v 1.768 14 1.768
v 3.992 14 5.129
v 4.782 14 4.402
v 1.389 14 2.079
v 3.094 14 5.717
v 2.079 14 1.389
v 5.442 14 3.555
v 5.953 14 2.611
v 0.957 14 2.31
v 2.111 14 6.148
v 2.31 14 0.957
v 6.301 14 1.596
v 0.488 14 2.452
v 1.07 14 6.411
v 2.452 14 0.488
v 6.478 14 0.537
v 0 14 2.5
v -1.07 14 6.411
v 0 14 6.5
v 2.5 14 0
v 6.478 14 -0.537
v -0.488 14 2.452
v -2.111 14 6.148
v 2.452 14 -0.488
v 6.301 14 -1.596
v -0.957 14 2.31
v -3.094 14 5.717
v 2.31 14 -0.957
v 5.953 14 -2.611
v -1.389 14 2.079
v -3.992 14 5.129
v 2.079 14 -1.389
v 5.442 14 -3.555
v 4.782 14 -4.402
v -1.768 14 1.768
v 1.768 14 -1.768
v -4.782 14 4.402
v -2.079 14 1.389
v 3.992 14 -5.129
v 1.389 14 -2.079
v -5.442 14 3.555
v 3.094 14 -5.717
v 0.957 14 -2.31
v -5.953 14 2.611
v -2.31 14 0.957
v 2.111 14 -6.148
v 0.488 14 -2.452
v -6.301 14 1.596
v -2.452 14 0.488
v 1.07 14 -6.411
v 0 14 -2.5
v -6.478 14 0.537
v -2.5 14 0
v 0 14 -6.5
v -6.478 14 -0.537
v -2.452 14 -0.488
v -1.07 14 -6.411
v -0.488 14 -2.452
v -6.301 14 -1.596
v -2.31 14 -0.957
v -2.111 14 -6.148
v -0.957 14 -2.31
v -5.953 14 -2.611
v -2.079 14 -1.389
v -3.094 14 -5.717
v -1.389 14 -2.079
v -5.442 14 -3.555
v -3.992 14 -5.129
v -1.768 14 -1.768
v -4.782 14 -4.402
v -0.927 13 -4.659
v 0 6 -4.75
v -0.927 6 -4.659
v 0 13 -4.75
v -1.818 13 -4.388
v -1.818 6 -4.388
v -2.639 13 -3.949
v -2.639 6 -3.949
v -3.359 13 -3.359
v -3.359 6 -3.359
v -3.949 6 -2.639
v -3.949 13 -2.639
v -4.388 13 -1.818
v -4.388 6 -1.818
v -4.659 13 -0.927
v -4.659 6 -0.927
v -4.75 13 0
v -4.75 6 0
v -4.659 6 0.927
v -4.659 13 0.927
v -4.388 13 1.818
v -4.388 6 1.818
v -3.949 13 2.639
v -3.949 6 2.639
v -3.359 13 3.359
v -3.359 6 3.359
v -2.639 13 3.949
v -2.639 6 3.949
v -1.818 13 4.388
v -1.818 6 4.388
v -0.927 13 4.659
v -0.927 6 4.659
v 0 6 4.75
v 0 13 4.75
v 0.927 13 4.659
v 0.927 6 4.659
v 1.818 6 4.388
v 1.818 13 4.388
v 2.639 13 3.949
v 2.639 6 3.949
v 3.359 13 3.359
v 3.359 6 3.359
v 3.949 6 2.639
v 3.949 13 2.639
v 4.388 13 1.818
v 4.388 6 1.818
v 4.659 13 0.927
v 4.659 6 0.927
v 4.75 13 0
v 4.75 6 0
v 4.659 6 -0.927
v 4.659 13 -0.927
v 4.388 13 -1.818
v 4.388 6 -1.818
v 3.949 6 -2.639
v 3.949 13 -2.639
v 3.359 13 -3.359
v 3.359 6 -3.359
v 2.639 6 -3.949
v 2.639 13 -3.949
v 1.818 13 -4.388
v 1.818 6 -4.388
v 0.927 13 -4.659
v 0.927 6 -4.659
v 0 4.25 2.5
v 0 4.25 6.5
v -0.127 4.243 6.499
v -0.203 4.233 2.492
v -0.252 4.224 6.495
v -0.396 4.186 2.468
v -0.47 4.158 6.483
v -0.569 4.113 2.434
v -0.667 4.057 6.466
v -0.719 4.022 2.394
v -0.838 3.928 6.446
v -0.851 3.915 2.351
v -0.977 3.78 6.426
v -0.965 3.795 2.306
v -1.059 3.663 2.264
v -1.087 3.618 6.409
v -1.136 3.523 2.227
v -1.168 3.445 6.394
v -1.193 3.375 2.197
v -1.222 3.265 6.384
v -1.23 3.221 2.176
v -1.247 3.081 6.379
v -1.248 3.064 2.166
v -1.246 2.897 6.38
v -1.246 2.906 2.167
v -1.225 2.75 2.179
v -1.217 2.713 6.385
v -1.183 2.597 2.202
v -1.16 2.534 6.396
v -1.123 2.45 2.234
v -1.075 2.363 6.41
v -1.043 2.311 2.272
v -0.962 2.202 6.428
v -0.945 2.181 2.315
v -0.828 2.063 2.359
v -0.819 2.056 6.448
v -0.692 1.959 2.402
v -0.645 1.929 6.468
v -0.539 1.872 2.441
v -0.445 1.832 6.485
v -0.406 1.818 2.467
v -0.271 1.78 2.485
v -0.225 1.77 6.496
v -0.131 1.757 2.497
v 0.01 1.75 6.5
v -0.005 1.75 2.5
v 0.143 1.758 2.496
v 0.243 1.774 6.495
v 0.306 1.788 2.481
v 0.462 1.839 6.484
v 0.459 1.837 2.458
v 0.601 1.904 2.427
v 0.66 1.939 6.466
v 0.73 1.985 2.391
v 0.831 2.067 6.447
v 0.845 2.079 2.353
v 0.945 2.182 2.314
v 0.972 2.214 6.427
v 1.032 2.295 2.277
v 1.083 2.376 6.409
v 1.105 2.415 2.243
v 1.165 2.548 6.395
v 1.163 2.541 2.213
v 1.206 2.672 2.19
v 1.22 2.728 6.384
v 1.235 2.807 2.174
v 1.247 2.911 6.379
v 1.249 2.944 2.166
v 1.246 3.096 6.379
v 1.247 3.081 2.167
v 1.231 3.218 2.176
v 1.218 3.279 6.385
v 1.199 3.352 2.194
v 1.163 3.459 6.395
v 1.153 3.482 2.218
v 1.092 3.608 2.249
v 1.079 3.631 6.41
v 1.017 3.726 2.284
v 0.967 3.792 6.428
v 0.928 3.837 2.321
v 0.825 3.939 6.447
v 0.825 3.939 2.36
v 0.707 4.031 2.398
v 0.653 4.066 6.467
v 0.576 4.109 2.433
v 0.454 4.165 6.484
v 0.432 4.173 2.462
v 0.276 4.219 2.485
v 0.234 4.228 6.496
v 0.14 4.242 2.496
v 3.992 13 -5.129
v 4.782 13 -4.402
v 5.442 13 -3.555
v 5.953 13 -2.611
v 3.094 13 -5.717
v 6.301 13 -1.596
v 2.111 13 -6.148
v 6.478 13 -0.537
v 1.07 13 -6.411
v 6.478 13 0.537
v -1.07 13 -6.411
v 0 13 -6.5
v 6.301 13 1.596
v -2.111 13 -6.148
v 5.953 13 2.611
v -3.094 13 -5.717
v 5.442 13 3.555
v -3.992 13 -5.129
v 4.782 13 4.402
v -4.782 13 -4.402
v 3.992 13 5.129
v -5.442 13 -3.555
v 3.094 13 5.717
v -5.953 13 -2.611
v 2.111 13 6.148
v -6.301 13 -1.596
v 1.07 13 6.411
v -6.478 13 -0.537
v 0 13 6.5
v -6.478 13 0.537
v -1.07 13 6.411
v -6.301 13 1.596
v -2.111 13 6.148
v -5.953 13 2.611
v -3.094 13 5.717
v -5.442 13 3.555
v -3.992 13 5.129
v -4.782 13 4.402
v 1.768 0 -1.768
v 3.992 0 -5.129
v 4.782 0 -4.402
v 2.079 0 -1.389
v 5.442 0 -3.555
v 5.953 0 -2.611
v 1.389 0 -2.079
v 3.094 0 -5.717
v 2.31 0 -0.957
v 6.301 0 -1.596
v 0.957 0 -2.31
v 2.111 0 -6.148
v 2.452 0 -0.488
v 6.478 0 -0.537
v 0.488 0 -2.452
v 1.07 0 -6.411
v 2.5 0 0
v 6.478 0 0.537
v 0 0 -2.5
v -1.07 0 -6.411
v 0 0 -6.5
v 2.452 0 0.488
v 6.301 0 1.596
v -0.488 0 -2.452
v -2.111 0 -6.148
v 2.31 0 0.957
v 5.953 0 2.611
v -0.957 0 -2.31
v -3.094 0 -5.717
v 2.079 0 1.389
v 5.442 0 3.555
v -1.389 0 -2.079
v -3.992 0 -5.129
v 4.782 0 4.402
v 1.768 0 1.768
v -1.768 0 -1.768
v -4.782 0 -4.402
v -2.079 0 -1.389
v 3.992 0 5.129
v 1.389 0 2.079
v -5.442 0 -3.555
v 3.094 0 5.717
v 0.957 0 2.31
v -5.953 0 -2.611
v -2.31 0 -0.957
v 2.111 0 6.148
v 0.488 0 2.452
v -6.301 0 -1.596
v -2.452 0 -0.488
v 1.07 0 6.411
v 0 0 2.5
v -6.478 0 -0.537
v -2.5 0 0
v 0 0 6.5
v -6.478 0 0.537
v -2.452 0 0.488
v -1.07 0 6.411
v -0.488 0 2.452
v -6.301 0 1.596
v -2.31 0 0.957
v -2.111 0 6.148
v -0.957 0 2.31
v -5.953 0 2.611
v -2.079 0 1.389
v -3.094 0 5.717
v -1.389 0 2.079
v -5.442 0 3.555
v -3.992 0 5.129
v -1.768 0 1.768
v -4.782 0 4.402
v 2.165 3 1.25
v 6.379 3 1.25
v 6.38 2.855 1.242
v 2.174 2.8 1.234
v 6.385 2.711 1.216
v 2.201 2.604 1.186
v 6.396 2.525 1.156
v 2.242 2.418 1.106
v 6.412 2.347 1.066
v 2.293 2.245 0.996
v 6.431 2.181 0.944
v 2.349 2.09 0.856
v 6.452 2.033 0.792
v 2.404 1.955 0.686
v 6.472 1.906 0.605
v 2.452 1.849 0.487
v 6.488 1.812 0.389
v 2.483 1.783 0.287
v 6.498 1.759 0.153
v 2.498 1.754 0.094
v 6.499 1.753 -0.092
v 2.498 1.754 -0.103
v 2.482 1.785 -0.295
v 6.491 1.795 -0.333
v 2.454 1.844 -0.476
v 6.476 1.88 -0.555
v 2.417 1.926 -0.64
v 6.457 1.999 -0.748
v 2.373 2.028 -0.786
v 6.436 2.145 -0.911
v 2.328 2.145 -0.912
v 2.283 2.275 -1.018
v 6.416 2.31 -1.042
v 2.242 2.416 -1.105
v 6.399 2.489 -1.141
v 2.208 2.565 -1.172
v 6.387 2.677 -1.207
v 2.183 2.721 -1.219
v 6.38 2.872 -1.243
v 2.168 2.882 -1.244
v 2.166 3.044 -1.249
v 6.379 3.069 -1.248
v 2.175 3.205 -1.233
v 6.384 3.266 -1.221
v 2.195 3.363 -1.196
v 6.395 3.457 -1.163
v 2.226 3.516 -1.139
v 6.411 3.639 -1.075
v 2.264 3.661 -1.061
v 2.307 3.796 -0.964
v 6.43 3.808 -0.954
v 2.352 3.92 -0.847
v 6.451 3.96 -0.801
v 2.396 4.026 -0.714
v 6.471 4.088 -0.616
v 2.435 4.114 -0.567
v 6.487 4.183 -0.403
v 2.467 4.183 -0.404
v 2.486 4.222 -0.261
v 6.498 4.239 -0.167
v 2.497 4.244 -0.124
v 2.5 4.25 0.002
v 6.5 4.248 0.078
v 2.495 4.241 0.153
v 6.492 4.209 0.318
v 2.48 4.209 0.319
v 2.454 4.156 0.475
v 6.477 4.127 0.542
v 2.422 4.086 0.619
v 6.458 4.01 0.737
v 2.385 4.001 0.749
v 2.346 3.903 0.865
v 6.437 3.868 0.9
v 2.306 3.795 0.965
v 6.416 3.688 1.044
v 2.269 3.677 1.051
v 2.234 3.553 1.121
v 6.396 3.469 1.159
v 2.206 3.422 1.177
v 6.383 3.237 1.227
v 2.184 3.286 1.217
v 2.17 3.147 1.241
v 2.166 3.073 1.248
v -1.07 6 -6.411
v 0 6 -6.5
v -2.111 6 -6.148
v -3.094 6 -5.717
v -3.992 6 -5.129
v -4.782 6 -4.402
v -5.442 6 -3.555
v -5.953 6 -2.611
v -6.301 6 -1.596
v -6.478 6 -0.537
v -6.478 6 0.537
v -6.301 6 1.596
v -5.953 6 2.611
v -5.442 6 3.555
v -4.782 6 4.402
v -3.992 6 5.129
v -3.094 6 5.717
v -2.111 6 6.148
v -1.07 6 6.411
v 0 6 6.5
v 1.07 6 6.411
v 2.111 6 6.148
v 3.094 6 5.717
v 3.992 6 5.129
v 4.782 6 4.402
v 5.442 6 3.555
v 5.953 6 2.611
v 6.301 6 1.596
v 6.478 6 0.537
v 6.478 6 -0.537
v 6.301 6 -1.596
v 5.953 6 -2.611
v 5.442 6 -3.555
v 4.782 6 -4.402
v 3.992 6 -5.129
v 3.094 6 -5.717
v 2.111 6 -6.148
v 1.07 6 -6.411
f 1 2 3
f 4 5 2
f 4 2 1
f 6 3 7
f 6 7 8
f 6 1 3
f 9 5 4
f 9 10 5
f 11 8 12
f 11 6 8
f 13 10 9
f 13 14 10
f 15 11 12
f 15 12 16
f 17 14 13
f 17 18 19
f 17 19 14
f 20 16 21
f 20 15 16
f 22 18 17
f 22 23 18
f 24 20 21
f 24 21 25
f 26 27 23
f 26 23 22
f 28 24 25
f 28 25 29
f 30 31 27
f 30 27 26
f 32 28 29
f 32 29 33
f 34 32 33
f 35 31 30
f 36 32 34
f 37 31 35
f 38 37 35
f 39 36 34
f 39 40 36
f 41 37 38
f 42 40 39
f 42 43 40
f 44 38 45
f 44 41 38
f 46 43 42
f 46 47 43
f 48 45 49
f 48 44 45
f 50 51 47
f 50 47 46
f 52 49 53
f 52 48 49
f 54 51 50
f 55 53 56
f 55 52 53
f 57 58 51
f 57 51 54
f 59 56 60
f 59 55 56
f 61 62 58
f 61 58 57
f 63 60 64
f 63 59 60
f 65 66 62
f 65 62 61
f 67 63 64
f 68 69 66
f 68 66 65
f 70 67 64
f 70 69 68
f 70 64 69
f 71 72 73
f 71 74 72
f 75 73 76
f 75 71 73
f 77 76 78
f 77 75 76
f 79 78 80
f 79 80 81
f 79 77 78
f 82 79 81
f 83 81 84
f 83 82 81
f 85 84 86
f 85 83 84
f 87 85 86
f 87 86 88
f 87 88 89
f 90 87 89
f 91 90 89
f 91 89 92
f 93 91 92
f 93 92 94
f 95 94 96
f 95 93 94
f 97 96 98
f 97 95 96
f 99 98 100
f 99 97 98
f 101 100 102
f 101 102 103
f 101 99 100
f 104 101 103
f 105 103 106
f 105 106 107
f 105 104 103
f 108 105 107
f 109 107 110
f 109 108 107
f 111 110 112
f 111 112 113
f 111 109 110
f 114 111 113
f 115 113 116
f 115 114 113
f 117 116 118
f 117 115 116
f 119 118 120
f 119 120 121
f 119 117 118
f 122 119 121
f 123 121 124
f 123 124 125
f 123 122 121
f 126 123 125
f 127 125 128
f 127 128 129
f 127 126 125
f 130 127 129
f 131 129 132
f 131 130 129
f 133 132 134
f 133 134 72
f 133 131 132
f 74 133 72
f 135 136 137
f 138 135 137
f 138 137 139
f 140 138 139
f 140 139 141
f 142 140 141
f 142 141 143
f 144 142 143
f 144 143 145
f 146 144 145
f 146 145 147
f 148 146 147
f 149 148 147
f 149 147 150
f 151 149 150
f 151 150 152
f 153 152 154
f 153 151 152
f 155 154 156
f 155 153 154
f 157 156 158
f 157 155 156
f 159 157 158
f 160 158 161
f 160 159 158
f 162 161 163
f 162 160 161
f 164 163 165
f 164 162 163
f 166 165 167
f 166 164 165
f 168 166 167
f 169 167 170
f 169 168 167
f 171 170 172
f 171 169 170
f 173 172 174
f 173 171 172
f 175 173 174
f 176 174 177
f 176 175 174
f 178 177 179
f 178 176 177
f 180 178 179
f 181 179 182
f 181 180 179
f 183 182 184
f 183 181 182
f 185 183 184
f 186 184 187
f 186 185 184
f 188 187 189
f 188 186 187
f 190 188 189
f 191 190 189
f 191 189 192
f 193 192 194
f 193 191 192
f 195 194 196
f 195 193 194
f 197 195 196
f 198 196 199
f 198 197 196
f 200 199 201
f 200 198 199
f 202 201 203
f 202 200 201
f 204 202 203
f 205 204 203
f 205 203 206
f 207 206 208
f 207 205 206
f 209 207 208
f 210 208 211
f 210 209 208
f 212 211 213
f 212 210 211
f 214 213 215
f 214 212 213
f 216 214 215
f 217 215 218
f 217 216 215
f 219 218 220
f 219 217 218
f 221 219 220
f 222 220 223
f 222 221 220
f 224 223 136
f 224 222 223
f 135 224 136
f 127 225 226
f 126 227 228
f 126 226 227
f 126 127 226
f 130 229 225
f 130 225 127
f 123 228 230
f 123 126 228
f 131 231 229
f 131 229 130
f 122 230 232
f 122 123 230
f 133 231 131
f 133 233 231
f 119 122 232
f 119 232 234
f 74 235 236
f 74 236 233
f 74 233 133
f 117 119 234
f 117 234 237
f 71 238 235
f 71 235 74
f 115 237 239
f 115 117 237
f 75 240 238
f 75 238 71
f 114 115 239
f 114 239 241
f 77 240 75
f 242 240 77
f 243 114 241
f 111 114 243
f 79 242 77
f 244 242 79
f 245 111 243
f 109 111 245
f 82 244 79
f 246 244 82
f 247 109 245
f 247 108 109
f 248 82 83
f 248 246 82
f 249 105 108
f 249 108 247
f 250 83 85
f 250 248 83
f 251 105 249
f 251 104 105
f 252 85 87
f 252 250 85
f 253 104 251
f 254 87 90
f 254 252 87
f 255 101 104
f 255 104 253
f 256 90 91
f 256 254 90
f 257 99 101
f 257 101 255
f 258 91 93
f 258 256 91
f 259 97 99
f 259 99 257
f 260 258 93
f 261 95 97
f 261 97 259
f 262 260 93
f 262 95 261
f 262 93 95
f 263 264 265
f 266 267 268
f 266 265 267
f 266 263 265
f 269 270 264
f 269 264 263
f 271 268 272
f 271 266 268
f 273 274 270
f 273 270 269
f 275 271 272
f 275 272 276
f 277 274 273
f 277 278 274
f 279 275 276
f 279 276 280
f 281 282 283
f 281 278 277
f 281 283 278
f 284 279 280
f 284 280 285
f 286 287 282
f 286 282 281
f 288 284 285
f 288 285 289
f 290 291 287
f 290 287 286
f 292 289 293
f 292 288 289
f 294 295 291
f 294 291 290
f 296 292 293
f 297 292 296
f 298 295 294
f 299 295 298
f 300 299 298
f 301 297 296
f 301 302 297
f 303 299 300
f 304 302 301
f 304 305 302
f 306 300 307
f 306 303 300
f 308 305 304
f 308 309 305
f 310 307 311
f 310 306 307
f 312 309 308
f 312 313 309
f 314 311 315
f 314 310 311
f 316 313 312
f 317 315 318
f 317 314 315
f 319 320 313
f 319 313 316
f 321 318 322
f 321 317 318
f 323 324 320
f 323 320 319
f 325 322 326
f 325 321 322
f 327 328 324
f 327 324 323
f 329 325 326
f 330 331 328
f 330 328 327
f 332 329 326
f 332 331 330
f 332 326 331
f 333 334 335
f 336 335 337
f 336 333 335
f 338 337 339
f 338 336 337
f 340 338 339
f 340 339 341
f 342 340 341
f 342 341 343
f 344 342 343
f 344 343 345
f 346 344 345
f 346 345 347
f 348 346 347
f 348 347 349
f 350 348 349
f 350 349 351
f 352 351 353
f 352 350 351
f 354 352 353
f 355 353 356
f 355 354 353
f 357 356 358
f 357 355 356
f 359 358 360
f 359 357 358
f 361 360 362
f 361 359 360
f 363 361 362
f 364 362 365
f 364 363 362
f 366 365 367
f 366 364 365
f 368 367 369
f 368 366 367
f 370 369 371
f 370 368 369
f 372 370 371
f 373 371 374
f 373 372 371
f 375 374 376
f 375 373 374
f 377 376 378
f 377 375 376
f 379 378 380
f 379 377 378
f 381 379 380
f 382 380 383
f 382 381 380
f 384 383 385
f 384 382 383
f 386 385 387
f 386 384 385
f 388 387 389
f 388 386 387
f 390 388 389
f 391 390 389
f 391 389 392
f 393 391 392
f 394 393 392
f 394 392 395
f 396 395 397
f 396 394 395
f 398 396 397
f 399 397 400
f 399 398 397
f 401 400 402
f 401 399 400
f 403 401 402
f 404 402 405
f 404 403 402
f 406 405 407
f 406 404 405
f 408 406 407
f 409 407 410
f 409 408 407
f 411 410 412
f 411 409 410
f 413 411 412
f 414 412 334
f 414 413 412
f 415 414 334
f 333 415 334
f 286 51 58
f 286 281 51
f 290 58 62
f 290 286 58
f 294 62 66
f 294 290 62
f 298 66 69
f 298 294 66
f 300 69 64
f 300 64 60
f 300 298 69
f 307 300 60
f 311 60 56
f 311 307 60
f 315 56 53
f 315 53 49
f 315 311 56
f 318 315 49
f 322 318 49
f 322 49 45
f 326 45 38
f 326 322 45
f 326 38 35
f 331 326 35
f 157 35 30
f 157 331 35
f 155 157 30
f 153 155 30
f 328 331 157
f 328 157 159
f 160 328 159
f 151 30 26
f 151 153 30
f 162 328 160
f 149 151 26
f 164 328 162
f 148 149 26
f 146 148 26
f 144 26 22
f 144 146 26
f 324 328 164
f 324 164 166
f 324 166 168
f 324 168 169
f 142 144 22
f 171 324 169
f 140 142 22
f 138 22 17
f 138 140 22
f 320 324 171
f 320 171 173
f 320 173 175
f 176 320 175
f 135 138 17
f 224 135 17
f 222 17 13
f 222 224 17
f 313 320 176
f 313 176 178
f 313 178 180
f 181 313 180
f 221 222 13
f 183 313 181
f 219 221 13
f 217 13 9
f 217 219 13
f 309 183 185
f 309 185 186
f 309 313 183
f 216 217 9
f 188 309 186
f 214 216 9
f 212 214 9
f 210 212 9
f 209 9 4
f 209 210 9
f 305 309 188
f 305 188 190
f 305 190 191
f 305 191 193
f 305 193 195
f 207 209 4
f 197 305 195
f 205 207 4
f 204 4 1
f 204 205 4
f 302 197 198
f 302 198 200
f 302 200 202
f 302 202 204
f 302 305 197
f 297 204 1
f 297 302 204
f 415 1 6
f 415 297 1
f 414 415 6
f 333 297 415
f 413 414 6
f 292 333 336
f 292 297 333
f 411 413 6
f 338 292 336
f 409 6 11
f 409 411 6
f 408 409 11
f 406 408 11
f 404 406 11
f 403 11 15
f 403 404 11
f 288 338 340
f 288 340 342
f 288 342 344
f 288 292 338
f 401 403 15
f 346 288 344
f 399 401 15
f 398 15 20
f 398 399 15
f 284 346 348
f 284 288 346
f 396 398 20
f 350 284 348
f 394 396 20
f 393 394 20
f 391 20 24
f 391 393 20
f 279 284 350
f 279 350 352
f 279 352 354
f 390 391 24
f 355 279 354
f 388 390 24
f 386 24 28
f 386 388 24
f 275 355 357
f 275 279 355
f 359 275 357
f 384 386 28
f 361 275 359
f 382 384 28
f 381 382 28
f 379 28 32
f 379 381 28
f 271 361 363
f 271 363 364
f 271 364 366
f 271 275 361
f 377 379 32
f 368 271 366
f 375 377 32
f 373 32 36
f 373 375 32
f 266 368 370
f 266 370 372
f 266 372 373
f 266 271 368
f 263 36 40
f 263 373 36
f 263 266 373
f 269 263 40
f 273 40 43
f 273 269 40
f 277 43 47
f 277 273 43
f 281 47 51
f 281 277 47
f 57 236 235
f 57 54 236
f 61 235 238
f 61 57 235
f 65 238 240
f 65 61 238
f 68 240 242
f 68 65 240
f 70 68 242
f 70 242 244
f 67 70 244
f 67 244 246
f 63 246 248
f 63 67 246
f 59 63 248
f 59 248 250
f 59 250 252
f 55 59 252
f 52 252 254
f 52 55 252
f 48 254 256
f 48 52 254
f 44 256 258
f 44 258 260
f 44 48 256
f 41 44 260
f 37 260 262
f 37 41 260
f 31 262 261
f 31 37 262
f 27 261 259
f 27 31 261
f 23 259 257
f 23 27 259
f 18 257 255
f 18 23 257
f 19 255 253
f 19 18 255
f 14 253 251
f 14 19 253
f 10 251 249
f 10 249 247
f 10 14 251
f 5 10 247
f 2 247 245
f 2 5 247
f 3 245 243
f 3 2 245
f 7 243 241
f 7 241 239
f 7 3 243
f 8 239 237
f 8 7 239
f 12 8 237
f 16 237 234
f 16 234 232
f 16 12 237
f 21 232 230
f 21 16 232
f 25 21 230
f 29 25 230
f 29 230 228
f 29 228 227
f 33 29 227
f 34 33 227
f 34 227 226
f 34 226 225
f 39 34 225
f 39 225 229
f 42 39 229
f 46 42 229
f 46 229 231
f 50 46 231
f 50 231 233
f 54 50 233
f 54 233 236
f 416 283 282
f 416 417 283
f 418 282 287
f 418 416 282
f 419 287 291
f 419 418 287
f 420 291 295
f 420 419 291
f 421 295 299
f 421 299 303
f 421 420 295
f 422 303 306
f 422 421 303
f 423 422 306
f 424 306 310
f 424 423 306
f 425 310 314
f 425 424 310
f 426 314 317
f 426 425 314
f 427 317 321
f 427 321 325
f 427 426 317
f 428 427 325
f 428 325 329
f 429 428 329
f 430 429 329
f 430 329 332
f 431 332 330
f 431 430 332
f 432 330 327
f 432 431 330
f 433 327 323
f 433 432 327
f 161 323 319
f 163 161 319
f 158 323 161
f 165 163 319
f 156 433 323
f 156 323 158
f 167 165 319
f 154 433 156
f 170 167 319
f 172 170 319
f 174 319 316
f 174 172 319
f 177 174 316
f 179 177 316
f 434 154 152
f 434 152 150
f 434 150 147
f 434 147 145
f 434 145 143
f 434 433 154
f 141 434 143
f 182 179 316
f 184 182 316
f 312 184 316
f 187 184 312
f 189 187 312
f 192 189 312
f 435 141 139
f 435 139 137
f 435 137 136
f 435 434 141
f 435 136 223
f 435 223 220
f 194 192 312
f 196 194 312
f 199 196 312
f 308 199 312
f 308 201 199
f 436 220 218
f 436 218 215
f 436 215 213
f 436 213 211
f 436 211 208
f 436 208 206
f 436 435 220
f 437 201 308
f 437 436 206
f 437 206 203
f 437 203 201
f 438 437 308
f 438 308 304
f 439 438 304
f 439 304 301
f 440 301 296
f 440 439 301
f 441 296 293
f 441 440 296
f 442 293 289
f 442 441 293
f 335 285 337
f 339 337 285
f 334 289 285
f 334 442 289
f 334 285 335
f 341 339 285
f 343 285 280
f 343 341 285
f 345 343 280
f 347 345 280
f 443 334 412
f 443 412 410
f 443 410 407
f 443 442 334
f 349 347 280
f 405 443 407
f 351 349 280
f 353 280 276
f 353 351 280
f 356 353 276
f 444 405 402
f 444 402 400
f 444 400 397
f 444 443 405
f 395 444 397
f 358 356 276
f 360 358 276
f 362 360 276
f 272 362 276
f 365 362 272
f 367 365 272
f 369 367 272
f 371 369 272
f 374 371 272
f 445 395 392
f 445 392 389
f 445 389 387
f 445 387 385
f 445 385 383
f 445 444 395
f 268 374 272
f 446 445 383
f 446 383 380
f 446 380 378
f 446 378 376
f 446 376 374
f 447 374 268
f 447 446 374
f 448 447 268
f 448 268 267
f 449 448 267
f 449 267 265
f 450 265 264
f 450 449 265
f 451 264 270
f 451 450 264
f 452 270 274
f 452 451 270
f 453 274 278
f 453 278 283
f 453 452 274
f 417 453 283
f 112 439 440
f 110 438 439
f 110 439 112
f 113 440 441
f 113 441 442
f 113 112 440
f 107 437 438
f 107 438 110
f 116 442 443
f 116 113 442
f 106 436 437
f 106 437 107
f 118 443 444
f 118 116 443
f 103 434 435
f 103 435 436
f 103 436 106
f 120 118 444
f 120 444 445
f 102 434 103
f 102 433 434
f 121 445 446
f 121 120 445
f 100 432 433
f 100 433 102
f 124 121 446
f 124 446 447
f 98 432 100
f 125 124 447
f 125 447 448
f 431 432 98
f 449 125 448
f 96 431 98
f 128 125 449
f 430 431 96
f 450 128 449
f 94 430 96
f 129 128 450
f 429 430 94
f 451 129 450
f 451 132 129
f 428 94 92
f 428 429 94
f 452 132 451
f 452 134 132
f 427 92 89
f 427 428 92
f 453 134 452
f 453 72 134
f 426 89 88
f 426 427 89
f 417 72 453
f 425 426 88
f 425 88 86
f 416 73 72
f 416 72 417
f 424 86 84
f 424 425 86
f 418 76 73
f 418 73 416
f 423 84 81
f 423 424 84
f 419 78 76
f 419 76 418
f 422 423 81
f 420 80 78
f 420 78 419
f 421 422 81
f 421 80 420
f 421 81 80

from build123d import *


with BuildPart() as part:
    # 草图1 → 旋转1 (revolve)
    with BuildSketch(Plane.XY, mode=Mode.PRIVATE) as revolve_1_sk:
        Polygon((2.5, 0), (6.5, 0), (6.5, 6), (4.75, 6), (4.75, 13), (6.5, 13), (6.5, 14), (2.5, 14), align=None)
    revolve(revolve_1_sk.sketch.rotate(Axis((0, 0, 0), (0, 1, 0)), 90), axis=Axis((0, 0, 0), (0, 1, 0)))

    # 草图3 → M3 螺纹孔1 (revolve, cut)
    with BuildSketch(Plane(origin=(0, 3, 0), x_dir=(0, 1, 0), z_dir=(1, 0, 0))):
        Polygon((0, 0), (0, 6.5), (1.25, 6.5), (1.25, 0.275), (1.525, 0), align=None)
    revolve(axis=Axis((0, 3, -6.35), (0, 0, 1)), mode=Mode.SUBTRACT)

    # 草图5 → M3 螺纹孔2 (revolve, cut)
    with BuildSketch(Plane.ZX.offset(3)):
        Polygon((0, 0), (0, 6.5), (1.25, 6.5), (1.25, 0.275), (1.525, 0), align=None)
    revolve(axis=Axis((-6.35, 3, 0), (1, 0, 0)), mode=Mode.SUBTRACT)


solid = part.part
